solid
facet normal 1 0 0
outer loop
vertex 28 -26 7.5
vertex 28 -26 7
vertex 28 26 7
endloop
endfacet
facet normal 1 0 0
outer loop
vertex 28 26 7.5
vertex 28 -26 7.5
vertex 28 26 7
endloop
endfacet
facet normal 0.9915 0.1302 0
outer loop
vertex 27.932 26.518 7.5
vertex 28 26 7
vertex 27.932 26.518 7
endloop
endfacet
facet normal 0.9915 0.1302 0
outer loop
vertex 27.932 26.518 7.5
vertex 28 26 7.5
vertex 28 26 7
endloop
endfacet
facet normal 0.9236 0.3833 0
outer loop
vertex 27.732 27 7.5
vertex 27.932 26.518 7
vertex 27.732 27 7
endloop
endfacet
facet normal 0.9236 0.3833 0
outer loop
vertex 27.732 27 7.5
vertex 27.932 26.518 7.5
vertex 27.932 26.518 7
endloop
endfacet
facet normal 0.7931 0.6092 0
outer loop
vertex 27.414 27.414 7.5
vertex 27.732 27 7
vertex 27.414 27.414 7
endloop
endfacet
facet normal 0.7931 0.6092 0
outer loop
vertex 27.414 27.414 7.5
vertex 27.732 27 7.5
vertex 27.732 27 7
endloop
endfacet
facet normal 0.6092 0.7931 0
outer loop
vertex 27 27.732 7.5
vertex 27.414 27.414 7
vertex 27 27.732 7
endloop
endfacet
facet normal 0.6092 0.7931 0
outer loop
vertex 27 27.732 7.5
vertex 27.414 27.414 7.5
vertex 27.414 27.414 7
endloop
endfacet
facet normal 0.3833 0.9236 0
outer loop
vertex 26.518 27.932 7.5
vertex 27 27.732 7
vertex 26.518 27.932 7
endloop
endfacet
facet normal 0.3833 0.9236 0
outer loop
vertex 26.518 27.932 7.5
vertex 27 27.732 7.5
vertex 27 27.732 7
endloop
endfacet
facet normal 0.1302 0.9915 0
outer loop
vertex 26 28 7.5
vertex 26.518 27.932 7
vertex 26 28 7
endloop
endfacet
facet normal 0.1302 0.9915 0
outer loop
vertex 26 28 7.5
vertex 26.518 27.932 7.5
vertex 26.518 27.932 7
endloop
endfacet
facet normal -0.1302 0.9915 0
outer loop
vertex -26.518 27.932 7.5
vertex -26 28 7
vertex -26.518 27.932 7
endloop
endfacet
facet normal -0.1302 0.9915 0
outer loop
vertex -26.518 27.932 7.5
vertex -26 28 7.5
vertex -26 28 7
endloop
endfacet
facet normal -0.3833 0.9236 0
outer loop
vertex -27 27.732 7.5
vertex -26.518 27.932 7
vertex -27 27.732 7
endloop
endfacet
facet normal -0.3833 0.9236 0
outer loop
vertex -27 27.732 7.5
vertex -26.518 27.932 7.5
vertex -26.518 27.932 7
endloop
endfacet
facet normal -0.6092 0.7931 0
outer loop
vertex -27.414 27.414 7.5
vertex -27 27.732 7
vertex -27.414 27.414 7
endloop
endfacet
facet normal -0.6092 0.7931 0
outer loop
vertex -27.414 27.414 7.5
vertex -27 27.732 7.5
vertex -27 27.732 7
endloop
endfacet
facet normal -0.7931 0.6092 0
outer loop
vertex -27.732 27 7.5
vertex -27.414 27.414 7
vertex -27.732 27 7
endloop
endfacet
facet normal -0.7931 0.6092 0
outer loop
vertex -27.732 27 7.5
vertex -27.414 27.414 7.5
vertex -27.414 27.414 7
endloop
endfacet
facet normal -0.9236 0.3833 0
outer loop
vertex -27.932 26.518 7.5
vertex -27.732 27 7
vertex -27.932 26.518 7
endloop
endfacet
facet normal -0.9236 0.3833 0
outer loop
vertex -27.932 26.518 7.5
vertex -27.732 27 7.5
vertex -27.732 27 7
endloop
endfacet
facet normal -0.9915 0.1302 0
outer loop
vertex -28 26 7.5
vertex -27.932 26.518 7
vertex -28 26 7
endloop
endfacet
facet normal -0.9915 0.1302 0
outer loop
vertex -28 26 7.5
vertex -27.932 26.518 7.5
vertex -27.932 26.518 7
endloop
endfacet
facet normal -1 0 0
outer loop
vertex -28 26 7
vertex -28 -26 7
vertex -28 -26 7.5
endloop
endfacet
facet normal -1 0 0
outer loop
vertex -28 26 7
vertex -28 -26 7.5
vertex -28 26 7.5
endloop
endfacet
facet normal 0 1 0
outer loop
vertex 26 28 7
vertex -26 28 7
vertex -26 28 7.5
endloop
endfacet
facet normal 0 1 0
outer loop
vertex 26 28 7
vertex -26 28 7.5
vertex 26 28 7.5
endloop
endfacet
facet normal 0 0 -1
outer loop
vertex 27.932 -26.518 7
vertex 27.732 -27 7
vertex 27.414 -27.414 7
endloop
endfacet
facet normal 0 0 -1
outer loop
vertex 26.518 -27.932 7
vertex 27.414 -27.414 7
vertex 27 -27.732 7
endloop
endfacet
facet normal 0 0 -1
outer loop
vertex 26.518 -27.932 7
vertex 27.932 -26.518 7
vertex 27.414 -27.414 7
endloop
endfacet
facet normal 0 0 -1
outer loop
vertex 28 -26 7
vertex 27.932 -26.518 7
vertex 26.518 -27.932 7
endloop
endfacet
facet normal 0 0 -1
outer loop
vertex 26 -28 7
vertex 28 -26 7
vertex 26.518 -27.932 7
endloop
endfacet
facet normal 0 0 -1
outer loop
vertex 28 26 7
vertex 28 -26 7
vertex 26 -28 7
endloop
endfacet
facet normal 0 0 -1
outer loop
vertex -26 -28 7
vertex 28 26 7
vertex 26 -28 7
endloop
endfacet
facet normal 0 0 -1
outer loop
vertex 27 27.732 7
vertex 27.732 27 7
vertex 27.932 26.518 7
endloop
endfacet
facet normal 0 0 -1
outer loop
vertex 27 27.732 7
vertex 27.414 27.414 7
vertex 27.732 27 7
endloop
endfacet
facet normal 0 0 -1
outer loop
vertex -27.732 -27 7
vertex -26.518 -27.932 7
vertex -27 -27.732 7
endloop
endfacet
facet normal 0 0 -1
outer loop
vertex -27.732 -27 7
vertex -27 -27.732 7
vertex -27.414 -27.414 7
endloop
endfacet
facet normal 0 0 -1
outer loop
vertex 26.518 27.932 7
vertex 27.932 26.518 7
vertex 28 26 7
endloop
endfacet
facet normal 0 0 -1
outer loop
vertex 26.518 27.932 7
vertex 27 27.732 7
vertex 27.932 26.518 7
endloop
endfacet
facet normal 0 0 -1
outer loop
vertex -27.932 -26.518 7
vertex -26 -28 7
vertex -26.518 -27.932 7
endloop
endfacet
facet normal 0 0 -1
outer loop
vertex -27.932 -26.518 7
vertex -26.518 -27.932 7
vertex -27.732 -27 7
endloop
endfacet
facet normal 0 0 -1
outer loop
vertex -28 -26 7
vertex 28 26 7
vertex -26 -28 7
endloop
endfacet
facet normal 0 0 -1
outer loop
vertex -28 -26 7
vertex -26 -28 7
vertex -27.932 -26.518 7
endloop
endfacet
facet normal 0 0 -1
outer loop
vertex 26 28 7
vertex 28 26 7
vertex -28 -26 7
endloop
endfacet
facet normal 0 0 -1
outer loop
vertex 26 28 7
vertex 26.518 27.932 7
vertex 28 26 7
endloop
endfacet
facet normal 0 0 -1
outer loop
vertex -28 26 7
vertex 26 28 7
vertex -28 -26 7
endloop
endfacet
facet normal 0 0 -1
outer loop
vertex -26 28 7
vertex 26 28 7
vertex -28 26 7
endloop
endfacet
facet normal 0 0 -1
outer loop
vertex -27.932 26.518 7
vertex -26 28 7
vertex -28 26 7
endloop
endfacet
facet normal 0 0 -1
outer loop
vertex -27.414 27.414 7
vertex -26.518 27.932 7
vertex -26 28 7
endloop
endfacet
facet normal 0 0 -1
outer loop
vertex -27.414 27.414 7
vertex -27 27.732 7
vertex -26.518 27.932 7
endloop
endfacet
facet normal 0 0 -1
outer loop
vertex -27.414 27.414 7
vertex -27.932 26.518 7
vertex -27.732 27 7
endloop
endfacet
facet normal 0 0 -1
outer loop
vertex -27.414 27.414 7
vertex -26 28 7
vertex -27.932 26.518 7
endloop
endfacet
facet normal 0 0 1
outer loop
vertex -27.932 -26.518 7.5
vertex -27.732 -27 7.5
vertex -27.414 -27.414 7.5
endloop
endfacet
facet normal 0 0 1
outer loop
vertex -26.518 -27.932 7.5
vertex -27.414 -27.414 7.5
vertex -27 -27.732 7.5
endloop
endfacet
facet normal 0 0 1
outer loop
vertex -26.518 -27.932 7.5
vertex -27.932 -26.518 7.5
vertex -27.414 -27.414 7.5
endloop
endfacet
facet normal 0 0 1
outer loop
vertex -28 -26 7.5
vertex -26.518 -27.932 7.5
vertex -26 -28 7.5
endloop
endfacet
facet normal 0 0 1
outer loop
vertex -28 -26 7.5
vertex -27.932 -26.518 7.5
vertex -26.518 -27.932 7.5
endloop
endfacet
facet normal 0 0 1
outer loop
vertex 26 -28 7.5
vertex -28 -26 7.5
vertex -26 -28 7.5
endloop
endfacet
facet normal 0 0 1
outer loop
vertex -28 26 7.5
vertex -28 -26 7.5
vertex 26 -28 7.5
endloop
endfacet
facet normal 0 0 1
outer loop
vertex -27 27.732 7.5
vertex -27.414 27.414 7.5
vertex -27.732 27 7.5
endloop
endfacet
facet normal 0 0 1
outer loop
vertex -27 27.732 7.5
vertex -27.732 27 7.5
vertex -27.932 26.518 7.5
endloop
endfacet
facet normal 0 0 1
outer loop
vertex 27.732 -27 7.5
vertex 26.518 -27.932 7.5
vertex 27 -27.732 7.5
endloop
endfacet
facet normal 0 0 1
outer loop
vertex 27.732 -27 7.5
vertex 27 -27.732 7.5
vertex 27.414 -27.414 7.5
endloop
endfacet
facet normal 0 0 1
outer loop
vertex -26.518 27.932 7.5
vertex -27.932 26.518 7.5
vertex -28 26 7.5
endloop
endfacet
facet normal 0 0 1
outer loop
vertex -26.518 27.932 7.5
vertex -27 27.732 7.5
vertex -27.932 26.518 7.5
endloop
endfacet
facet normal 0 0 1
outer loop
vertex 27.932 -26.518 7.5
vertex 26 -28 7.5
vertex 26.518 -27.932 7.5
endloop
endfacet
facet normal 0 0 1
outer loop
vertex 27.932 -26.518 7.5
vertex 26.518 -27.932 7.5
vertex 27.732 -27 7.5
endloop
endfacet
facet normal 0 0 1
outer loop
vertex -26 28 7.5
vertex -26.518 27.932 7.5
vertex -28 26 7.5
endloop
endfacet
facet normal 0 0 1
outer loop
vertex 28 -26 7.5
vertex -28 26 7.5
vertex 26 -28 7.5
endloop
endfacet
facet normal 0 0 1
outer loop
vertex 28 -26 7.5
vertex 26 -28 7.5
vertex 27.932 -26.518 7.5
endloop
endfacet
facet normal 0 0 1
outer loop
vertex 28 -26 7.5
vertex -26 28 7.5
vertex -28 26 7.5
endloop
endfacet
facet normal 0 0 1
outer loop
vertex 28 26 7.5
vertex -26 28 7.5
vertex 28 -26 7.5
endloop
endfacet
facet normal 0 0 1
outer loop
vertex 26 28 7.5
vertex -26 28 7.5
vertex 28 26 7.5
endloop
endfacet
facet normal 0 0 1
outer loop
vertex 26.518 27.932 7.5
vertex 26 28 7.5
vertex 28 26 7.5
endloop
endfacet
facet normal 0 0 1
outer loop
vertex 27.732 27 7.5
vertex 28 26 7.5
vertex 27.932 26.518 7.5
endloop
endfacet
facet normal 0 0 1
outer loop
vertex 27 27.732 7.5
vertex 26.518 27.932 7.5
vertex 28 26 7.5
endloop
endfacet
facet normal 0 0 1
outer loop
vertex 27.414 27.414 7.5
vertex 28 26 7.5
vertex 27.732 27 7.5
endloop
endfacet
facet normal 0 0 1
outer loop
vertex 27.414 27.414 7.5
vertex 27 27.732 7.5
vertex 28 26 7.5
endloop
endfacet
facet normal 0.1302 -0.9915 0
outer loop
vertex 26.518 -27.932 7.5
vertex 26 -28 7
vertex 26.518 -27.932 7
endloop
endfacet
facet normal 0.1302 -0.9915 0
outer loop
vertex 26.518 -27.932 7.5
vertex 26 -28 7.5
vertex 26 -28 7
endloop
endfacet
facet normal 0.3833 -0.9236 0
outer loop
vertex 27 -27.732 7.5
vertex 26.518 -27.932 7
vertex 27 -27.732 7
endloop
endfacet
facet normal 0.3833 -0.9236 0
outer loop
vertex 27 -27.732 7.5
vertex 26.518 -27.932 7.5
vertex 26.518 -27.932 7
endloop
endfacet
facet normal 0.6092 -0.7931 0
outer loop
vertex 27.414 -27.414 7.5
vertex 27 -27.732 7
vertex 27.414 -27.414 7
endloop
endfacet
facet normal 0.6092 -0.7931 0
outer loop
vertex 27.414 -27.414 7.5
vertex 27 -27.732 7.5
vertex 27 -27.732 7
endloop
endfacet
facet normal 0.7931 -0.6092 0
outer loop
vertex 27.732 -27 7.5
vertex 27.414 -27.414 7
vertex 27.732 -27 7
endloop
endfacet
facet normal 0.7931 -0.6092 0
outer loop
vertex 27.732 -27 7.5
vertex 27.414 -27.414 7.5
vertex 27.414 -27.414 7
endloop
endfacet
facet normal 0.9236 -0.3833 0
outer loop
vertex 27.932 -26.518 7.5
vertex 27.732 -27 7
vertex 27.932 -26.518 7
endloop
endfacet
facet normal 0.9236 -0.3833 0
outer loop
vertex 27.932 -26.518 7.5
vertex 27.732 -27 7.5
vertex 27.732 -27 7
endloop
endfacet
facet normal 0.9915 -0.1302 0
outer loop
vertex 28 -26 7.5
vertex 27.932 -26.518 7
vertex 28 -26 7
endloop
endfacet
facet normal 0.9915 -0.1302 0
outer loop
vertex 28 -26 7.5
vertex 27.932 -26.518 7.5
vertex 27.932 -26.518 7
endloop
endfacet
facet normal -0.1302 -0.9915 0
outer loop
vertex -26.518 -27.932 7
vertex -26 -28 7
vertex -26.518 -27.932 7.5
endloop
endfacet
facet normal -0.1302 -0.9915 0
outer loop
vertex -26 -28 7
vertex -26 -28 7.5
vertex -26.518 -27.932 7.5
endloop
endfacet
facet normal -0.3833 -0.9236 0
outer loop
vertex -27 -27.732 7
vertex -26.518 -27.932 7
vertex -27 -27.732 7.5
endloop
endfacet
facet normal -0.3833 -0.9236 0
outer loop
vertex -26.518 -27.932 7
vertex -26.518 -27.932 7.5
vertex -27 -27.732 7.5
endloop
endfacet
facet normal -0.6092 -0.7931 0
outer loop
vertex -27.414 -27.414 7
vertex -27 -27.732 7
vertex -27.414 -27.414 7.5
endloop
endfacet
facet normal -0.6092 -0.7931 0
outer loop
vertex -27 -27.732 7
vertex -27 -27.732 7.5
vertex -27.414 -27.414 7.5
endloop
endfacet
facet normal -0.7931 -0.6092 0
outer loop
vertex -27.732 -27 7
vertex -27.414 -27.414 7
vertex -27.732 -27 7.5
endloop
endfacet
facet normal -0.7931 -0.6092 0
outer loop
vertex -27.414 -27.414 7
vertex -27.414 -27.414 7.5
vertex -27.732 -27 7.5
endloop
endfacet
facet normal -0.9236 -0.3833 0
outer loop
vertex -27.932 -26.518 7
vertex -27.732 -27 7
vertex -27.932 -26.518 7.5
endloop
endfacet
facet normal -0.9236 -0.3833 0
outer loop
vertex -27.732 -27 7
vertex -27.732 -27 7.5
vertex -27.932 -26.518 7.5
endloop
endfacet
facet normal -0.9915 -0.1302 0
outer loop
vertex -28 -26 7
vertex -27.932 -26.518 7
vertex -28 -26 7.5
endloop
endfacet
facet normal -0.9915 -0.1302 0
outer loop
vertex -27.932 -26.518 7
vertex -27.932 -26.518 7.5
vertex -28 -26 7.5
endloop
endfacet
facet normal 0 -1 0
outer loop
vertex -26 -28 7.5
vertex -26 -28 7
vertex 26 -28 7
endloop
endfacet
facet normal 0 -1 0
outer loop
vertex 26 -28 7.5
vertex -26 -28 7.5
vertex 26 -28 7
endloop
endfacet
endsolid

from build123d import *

# Parameters (mm, degrees)
ESQUISSE1_W             = 60
ESQUISSE1_H             = 60
BASE_EXTRUSION_DEPTH    = 7
ESQUISSE4_W             = 56
ESQUISSE4_H             = 56
BOSS_EXTRU_2_DEPTH      = 0.5
CONG_3_R                = 2
ESQUISSE5_W             = 60
ESQUISSE5_H             = 60
ENL_V_MAT_EXTRU_2_DEPTH = 7


with BuildPart() as part:
    # Esquisse1 → Base-Extrusion (new body)
    with BuildSketch(Plane.XY):
        Rectangle(ESQUISSE1_W, ESQUISSE1_H)
    extrude(amount=BASE_EXTRUSION_DEPTH)

    # Esquisse4 → Boss.-Extru.2 (add)
    with BuildSketch(Plane.XY.offset(7)):
        Rectangle(ESQUISSE4_W, ESQUISSE4_H)
    extrude(amount=BOSS_EXTRU_2_DEPTH)

    # Congé3
    cong_3_edges = [part.edges().sort_by_distance(p)[0] for p in [
        (-28, 28, 7.25),
        (28, 28, 7.25),
        (28, -28, 7.25),
        (-28, -28, 7.25),
    ]]
    fillet(cong_3_edges, radius=CONG_3_R)

    # Esquisse5 → Enlèv. mat.-Extru.2 (cut)
    with BuildSketch(Plane(origin=(0, 0, 0), x_dir=(-1, 0, 0), z_dir=(0, 0, -1))):
        Rectangle(ESQUISSE5_W, ESQUISSE5_H)
    extrude(amount=-ENL_V_MAT_EXTRU_2_DEPTH, mode=Mode.SUBTRACT)


solid = part.part
